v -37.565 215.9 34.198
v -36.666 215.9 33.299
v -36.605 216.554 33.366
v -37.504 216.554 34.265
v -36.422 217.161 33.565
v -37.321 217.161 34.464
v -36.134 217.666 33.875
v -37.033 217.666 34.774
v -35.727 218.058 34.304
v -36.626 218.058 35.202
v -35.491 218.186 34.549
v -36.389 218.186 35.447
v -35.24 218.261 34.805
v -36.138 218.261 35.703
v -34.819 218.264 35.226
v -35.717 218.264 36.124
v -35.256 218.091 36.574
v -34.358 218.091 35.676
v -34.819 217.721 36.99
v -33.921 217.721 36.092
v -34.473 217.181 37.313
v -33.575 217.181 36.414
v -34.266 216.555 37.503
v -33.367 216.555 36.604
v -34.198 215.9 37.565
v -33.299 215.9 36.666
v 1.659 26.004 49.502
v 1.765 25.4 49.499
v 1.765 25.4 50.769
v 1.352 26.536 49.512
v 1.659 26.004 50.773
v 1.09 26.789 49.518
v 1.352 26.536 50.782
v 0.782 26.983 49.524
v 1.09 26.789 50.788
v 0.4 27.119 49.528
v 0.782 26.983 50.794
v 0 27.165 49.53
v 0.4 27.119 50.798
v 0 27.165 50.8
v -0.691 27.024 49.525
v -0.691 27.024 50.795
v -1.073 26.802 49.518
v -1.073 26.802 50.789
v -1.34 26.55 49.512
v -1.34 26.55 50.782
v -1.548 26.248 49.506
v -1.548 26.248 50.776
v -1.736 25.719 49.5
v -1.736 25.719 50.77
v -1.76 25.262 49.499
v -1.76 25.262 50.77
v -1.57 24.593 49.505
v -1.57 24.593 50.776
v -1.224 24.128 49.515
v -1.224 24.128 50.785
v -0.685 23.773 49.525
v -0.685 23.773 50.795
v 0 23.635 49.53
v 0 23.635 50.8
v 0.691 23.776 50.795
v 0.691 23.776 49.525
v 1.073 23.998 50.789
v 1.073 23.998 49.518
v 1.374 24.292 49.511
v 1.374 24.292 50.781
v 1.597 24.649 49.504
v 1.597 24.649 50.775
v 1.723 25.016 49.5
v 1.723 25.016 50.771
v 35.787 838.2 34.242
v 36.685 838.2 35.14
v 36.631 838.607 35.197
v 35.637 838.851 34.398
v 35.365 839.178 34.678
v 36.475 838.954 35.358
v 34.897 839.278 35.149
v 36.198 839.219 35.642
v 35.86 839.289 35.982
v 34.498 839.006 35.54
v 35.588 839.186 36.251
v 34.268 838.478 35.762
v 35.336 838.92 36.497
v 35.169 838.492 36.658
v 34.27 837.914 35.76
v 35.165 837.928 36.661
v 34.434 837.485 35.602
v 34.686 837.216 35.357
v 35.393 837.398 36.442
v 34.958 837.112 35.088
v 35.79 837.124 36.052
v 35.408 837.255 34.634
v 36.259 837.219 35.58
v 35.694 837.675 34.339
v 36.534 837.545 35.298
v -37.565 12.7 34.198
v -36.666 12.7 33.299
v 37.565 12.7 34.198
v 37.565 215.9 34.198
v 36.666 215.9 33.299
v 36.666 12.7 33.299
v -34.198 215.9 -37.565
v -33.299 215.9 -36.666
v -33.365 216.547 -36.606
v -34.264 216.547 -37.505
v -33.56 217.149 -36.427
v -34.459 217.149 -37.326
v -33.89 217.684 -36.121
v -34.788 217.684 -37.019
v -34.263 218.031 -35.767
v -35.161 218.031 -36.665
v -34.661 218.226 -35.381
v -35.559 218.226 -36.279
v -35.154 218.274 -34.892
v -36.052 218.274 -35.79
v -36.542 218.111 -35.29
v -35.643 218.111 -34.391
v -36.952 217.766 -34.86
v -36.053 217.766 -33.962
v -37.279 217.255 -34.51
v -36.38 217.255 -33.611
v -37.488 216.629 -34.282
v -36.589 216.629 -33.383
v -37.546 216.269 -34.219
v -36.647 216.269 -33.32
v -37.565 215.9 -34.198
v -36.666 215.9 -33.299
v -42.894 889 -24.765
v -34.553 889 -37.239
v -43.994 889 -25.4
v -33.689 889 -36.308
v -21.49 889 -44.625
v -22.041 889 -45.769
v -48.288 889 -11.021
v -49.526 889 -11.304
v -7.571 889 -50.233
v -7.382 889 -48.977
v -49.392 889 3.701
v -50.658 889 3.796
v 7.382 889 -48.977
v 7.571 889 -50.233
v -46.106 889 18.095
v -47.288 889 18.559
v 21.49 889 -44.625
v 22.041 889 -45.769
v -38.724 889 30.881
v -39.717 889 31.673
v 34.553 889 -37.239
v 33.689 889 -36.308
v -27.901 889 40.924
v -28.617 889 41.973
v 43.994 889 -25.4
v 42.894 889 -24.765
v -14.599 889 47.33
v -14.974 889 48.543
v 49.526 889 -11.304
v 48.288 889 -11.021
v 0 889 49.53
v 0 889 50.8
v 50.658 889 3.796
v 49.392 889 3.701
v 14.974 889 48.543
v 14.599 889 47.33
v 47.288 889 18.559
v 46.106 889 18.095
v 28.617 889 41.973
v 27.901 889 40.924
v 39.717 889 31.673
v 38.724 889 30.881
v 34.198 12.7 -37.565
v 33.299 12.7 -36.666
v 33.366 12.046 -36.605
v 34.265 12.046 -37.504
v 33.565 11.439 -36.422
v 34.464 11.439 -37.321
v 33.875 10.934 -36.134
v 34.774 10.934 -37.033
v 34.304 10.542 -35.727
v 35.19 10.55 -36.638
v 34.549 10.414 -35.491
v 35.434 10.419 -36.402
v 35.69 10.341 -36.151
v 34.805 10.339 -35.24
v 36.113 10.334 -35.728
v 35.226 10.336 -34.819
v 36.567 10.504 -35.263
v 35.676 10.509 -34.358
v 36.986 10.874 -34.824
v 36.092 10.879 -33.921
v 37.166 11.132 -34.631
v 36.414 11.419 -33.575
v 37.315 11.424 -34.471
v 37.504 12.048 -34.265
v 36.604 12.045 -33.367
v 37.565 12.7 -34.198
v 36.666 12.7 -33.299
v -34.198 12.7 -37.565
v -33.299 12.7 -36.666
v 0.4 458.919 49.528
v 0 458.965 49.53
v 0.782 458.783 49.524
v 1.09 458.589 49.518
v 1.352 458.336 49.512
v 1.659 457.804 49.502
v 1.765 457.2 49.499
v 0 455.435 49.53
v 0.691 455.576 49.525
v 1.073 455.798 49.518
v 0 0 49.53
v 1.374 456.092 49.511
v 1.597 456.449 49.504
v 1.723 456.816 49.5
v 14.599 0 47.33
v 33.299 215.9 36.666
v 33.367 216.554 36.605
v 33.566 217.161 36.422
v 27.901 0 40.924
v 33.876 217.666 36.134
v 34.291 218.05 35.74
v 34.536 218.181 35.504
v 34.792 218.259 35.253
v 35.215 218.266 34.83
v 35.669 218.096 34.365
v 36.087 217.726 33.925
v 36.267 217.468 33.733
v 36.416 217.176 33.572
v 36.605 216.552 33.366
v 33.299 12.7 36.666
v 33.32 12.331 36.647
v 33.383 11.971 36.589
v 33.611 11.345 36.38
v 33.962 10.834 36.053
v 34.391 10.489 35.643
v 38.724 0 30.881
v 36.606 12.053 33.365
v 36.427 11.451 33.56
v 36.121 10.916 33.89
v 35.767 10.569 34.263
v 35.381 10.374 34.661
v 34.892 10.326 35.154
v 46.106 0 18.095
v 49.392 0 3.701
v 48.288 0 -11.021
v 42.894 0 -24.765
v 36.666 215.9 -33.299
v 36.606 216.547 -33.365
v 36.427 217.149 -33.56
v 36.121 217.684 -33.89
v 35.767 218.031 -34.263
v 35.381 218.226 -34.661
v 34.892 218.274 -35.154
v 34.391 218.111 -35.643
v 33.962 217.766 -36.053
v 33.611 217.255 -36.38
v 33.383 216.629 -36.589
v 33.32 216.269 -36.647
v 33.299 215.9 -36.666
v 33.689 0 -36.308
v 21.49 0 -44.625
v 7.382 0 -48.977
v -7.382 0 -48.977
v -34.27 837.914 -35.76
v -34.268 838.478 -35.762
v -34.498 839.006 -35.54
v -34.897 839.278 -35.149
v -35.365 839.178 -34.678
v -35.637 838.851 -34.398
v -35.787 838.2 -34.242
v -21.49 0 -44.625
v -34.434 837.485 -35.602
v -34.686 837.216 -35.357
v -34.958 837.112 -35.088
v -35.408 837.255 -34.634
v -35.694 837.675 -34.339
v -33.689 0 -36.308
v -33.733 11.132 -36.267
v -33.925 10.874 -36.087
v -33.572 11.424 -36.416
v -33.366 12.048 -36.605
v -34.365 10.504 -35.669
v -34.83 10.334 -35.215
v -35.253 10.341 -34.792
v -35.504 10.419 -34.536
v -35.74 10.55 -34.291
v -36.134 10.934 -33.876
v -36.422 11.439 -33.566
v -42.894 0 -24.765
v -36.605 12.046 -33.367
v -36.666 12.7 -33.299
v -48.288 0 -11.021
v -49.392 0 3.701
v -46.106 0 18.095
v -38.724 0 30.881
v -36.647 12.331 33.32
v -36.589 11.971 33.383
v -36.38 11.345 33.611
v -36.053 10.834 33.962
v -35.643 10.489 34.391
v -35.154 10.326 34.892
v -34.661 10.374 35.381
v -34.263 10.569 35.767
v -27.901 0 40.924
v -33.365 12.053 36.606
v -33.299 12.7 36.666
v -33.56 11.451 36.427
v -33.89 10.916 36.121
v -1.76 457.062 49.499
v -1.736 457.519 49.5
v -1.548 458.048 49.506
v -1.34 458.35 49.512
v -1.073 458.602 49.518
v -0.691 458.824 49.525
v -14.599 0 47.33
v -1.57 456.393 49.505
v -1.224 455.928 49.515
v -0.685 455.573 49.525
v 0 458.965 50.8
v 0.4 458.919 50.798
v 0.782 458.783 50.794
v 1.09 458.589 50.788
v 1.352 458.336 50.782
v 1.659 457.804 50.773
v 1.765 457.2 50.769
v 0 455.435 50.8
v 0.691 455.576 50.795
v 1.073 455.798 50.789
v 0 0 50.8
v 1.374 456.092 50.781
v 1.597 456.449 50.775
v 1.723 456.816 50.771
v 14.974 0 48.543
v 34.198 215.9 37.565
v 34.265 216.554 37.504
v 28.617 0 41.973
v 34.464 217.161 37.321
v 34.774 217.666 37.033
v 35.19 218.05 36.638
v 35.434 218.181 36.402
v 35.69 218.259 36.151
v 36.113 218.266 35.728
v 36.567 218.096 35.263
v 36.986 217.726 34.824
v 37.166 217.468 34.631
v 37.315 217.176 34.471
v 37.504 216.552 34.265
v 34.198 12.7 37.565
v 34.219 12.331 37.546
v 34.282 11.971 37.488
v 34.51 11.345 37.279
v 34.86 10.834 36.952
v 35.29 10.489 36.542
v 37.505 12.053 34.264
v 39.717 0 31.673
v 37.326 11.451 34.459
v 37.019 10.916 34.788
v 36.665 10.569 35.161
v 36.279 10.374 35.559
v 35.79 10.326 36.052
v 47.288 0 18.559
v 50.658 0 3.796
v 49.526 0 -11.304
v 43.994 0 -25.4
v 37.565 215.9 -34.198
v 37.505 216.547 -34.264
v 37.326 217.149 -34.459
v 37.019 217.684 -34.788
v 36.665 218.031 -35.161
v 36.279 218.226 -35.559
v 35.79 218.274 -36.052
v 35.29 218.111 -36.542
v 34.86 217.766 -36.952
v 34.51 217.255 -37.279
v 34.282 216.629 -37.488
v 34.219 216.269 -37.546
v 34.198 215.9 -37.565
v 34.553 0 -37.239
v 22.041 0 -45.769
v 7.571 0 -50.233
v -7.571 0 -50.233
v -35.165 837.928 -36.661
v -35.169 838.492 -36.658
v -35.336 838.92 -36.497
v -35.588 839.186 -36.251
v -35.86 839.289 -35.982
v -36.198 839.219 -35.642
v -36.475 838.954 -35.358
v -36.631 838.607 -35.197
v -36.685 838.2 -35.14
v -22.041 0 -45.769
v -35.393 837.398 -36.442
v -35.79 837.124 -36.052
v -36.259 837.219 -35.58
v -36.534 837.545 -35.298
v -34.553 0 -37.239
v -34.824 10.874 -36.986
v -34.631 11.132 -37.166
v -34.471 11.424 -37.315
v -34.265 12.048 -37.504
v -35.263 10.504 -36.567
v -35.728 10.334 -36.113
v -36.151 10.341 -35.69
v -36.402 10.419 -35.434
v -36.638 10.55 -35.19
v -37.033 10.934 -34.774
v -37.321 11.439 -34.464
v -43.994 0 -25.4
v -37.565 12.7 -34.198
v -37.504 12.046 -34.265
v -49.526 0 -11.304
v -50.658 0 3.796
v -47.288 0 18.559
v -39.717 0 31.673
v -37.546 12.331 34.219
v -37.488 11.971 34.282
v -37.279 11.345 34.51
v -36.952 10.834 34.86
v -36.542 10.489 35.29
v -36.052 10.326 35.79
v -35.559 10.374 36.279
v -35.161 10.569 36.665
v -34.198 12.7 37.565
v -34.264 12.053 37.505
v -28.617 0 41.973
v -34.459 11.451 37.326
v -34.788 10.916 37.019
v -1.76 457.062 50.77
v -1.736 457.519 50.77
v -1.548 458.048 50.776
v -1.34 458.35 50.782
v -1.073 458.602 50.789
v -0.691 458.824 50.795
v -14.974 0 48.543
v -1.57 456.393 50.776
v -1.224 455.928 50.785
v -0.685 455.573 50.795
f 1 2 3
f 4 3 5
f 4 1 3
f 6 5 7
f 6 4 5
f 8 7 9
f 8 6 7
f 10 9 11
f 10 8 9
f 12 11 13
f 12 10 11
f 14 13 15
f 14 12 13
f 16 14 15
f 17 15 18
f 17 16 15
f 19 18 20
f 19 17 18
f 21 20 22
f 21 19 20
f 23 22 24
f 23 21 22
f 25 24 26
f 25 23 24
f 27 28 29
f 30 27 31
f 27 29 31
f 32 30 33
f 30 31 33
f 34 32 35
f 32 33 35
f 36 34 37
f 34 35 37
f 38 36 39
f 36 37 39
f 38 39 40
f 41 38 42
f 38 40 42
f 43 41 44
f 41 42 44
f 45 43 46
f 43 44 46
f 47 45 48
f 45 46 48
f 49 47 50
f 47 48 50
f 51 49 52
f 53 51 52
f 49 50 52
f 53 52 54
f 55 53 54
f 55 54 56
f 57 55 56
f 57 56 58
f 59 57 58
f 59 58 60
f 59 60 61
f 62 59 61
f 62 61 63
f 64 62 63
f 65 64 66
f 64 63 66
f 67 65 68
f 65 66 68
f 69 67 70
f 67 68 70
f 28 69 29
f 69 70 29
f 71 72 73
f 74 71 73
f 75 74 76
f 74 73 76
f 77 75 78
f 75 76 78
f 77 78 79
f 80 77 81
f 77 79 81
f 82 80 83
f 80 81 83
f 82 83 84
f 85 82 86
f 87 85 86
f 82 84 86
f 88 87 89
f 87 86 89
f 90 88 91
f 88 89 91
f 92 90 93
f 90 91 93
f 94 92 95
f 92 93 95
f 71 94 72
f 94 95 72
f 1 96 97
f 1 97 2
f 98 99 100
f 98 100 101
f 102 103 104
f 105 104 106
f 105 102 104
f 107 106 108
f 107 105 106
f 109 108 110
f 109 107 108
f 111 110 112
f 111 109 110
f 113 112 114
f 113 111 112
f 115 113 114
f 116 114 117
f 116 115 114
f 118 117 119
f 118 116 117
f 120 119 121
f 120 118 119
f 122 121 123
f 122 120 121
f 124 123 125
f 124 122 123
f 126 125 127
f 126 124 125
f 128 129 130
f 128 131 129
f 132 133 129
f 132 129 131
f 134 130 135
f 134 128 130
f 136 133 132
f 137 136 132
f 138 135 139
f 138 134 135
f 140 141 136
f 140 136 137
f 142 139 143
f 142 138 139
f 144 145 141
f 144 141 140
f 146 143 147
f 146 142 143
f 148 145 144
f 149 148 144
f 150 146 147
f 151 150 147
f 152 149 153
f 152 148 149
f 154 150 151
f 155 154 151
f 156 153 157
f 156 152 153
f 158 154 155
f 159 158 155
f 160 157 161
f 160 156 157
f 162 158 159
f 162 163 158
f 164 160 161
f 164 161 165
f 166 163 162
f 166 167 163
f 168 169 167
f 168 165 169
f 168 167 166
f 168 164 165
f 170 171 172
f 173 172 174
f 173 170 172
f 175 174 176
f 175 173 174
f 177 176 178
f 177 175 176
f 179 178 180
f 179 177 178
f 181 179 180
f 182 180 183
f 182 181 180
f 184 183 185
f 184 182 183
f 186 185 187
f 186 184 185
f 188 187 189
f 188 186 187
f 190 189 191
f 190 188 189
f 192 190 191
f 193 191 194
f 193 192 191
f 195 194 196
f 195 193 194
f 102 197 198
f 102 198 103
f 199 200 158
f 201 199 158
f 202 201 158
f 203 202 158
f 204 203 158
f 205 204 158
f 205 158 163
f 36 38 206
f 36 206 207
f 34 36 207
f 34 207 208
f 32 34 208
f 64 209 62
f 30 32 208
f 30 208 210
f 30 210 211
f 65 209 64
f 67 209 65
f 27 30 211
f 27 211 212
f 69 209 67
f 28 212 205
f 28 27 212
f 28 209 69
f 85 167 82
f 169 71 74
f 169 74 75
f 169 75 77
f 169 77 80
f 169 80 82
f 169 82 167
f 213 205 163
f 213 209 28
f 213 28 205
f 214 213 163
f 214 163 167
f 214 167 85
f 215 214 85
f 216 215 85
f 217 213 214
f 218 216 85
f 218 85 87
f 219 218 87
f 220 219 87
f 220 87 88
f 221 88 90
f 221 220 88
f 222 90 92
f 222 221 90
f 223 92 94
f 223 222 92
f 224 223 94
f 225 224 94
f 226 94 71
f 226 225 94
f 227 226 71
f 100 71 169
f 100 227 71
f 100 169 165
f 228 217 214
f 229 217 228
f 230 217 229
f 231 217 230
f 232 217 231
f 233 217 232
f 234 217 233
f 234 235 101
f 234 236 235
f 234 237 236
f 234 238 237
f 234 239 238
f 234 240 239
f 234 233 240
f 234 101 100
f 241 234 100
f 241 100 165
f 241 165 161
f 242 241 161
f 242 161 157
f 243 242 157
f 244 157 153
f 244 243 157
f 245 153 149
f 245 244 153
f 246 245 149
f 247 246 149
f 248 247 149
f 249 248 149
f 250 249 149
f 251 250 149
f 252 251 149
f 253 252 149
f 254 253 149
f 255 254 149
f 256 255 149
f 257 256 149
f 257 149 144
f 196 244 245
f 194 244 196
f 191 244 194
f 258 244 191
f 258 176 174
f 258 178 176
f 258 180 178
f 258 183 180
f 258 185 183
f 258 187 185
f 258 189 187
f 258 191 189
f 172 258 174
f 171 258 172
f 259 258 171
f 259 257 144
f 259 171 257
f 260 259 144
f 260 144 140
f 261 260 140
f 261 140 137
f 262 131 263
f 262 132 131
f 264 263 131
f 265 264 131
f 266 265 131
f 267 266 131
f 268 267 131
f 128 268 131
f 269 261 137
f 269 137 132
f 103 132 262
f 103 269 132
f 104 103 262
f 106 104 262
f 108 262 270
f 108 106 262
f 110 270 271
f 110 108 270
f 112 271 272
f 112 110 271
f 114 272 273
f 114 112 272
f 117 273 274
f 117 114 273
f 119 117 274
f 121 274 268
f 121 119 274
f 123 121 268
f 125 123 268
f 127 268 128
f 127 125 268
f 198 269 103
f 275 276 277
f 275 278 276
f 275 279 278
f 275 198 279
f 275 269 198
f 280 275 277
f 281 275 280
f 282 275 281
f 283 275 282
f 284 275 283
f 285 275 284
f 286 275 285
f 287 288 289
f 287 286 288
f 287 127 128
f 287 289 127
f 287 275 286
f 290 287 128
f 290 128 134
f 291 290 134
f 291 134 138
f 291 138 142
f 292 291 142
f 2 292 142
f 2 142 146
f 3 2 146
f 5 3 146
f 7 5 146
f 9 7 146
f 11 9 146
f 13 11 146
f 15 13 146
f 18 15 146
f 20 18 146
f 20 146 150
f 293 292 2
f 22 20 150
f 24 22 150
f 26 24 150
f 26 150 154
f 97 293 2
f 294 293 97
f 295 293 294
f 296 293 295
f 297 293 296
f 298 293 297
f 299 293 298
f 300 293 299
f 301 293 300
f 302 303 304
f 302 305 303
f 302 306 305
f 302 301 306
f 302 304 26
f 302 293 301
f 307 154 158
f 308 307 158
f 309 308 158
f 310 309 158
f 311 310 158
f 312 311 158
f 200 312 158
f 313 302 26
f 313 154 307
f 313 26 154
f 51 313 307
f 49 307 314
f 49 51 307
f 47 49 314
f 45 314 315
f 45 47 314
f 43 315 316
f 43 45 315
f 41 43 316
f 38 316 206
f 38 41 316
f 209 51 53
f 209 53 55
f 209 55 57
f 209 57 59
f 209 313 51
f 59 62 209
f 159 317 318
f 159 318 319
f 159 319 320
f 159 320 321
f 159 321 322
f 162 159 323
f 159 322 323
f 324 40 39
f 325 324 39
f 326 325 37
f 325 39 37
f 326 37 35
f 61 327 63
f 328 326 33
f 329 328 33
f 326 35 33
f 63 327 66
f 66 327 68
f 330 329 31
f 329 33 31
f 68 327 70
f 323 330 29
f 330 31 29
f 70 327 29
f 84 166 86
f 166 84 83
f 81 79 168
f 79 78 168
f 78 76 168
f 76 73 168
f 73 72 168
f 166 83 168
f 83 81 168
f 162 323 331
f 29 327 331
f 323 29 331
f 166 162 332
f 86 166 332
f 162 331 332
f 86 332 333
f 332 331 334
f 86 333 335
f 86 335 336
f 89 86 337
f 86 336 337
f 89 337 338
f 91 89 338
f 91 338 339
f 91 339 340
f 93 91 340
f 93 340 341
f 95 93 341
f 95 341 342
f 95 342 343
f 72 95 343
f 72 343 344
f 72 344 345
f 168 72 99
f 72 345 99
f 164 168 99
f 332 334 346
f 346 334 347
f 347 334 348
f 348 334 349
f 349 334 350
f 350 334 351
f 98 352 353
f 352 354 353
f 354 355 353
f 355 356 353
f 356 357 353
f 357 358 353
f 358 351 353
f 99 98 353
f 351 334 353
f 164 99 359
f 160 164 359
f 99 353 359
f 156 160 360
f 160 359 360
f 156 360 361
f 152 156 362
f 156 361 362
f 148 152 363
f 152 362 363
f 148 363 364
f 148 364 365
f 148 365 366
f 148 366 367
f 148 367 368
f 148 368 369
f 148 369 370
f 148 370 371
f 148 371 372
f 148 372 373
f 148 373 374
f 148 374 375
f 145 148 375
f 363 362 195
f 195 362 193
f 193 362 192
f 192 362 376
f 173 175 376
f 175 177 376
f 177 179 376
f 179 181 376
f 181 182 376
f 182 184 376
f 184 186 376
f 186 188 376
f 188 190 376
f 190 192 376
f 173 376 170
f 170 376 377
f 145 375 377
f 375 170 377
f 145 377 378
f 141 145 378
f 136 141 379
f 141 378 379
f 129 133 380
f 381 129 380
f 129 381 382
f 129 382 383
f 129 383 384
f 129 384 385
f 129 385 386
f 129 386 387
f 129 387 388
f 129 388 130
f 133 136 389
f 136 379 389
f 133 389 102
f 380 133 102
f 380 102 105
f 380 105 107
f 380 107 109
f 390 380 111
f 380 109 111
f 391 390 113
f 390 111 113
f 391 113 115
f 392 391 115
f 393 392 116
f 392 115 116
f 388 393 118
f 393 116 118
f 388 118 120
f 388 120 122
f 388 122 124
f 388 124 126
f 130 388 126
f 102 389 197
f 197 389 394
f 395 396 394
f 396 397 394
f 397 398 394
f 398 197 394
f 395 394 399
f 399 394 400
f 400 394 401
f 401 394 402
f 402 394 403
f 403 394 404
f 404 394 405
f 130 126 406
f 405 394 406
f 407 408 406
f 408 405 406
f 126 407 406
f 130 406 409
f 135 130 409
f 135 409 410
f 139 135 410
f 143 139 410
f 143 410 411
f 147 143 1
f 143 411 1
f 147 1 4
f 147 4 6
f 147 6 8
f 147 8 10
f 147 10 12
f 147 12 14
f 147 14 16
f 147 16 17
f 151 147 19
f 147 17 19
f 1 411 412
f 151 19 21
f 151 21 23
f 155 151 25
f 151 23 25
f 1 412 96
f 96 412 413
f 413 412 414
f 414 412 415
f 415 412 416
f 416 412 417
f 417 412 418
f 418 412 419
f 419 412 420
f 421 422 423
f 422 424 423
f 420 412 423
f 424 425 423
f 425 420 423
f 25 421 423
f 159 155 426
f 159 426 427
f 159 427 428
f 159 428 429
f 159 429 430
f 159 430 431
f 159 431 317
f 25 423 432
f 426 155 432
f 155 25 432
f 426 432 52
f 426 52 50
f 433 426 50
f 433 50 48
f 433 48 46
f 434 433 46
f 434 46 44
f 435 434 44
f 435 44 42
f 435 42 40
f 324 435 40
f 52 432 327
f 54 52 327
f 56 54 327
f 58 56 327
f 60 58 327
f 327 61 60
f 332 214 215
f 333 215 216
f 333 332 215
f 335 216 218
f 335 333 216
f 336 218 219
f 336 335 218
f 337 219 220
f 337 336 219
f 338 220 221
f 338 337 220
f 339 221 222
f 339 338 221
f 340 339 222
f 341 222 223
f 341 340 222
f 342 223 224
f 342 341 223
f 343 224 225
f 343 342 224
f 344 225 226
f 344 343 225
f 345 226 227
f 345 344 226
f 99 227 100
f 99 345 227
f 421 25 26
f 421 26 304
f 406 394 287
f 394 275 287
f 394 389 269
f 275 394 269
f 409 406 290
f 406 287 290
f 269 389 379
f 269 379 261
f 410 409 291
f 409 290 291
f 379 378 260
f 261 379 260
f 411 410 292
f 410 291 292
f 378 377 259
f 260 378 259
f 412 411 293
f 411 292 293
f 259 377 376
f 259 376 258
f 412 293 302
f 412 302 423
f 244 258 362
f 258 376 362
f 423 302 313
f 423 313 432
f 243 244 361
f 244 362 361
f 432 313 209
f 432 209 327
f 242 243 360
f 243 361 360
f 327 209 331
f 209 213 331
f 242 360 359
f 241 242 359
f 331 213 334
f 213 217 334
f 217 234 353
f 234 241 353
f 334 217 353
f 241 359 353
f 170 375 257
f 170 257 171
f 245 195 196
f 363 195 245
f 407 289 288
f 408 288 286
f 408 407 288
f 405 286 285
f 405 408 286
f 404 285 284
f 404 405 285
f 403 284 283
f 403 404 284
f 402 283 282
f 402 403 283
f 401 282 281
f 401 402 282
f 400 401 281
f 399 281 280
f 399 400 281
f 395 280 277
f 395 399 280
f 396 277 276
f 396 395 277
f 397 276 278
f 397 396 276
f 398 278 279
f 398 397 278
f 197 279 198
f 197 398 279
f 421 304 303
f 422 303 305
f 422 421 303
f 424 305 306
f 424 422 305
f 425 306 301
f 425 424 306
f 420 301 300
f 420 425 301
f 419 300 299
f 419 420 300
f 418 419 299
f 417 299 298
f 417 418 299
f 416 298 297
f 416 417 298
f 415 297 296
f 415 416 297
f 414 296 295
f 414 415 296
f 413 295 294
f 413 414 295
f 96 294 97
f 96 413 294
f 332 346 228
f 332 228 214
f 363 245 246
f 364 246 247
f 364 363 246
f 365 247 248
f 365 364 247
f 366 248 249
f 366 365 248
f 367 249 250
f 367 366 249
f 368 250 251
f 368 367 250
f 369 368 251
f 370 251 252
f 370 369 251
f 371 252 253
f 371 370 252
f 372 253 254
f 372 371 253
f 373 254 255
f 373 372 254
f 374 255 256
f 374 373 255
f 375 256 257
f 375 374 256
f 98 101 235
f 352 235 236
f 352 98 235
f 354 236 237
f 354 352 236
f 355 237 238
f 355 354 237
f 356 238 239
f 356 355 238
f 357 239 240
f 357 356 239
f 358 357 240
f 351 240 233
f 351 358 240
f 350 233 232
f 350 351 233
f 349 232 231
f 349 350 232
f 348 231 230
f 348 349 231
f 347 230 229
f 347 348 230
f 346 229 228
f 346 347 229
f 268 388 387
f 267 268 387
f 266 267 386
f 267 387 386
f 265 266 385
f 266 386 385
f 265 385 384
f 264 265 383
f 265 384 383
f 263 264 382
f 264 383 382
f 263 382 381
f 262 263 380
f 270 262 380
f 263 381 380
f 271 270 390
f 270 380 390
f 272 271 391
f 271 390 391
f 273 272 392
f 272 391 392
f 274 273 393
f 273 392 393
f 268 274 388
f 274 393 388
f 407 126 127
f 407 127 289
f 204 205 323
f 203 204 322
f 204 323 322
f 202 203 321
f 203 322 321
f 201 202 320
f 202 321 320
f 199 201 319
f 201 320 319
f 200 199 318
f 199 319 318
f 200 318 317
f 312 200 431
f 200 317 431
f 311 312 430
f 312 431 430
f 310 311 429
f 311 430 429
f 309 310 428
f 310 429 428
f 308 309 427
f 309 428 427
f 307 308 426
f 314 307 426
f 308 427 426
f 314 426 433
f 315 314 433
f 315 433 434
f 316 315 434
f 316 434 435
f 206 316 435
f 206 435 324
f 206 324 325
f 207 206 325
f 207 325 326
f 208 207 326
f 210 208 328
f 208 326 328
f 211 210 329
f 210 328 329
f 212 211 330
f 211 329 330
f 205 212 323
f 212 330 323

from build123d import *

# Parameters (mm, degrees)
SKETCH1_R           = 50.8
SKETCH1_R_2         = 49.53
BOSS_EXTRUDE1_DEPTH = 889
CUT_EXTRUDE1_DEPTH  = 152.4
CIRPATTERN1_COUNT   = 4
SKETCH3_R           = 1.7653
CUT_EXTRUDE2_DEPTH  = 11.684
SKETCH4_R           = 1.0922
CUT_EXTRUDE3_DEPTH  = 25.4
CIRPATTERN2_COUNT   = 2


with BuildPart() as part:
    # Sketch1 → Boss-Extrude1 (new body)
    with BuildSketch(Plane(origin=(0, 0, 0), x_dir=(1, 0, 0), z_dir=(0, 1, 0))):
        with Locations(Location((0, 0, 0), (0, 0, 270))):
            Circle(SKETCH1_R)
        with Locations(Location((0, 0, 0), (0, 0, 270))):
            Circle(SKETCH1_R_2, mode=Mode.SUBTRACT)
    extrude(amount=BOSS_EXTRUDE1_DEPTH)

    # Sketch2 → Cut-Extrude1 (cut)
    with BuildSketch(Plane(origin=(10.001989034, 1243.355570529, -188.138382022), x_dir=(0, 1, 0), z_dir=(0.7071067811865634, 0, -0.7071067811865316))):
        with BuildLine():
            Line((-1230.655570529, 128.342701458), (-1027.455570529, 128.342701458))
            ThreePointArc((-1027.455570529, 128.342701458), (-1025.074320529, 125.961451458), (-1027.455570529, 123.580201458))
            Line((-1027.455570529, 123.580201458), (-1230.655570529, 123.580201458))
            ThreePointArc((-1230.655570529, 123.580201458), (-1233.036820529, 125.961451458), (-1230.655570529, 128.342701458))
        make_face()
    cut_extrude1 = extrude(amount=-CUT_EXTRUDE1_DEPTH, mode=Mode.SUBTRACT)

    # CirPattern1: Cut-Extrude1 ×4 about axis
    cirpattern1_axis = Axis((0, 0, 0), (0, 1, 0))
    for i in range(1, CIRPATTERN1_COUNT):
        add(cut_extrude1.rotate(cirpattern1_axis, i * 360 / CIRPATTERN1_COUNT), mode=Mode.SUBTRACT)

    # Sketch3 → Cut-Extrude2 (cut)
    with BuildSketch(Plane(origin=(271.091614788, 1243.355570529, 52.3875), x_dir=(-1, 0, 0), z_dir=(0, 0, 1))):
        with Locations(Location((271.091614788, 1217.955570529, 0), (0, 0, 180))):
            Circle(SKETCH3_R)
        with Locations(Location((271.091614788, 786.155570529, 0), (0, 0, 180))):
            Circle(SKETCH3_R)
    extrude(amount=-CUT_EXTRUDE2_DEPTH, mode=Mode.SUBTRACT)

    # Sketch4 → Cut-Extrude3 (cut)
    with BuildSketch(Plane(origin=(120.58027232, 708.404628356, -48.738223352), x_dir=(-0.7071067811865634, 2.660214291711019e-15, 0.7071067811865317), z_dir=(0.7071067811865317, -1.2152886494782433e-14, 0.7071067811865634))):
        with Locations(Location((119.72625647, -129.795371644, 0), (0, 0, 180))):
            Circle(SKETCH4_R)
    cut_extrude3 = extrude(amount=-CUT_EXTRUDE3_DEPTH, mode=Mode.SUBTRACT)

    # CirPattern2: Cut-Extrude3 ×2 about axis
    cirpattern2_axis = Axis((0, 889, 0), (0, -1, 0))
    for i in range(1, CIRPATTERN2_COUNT):
        add(cut_extrude3.rotate(cirpattern2_axis, i * 360 / CIRPATTERN2_COUNT), mode=Mode.SUBTRACT)


solid = part.part
